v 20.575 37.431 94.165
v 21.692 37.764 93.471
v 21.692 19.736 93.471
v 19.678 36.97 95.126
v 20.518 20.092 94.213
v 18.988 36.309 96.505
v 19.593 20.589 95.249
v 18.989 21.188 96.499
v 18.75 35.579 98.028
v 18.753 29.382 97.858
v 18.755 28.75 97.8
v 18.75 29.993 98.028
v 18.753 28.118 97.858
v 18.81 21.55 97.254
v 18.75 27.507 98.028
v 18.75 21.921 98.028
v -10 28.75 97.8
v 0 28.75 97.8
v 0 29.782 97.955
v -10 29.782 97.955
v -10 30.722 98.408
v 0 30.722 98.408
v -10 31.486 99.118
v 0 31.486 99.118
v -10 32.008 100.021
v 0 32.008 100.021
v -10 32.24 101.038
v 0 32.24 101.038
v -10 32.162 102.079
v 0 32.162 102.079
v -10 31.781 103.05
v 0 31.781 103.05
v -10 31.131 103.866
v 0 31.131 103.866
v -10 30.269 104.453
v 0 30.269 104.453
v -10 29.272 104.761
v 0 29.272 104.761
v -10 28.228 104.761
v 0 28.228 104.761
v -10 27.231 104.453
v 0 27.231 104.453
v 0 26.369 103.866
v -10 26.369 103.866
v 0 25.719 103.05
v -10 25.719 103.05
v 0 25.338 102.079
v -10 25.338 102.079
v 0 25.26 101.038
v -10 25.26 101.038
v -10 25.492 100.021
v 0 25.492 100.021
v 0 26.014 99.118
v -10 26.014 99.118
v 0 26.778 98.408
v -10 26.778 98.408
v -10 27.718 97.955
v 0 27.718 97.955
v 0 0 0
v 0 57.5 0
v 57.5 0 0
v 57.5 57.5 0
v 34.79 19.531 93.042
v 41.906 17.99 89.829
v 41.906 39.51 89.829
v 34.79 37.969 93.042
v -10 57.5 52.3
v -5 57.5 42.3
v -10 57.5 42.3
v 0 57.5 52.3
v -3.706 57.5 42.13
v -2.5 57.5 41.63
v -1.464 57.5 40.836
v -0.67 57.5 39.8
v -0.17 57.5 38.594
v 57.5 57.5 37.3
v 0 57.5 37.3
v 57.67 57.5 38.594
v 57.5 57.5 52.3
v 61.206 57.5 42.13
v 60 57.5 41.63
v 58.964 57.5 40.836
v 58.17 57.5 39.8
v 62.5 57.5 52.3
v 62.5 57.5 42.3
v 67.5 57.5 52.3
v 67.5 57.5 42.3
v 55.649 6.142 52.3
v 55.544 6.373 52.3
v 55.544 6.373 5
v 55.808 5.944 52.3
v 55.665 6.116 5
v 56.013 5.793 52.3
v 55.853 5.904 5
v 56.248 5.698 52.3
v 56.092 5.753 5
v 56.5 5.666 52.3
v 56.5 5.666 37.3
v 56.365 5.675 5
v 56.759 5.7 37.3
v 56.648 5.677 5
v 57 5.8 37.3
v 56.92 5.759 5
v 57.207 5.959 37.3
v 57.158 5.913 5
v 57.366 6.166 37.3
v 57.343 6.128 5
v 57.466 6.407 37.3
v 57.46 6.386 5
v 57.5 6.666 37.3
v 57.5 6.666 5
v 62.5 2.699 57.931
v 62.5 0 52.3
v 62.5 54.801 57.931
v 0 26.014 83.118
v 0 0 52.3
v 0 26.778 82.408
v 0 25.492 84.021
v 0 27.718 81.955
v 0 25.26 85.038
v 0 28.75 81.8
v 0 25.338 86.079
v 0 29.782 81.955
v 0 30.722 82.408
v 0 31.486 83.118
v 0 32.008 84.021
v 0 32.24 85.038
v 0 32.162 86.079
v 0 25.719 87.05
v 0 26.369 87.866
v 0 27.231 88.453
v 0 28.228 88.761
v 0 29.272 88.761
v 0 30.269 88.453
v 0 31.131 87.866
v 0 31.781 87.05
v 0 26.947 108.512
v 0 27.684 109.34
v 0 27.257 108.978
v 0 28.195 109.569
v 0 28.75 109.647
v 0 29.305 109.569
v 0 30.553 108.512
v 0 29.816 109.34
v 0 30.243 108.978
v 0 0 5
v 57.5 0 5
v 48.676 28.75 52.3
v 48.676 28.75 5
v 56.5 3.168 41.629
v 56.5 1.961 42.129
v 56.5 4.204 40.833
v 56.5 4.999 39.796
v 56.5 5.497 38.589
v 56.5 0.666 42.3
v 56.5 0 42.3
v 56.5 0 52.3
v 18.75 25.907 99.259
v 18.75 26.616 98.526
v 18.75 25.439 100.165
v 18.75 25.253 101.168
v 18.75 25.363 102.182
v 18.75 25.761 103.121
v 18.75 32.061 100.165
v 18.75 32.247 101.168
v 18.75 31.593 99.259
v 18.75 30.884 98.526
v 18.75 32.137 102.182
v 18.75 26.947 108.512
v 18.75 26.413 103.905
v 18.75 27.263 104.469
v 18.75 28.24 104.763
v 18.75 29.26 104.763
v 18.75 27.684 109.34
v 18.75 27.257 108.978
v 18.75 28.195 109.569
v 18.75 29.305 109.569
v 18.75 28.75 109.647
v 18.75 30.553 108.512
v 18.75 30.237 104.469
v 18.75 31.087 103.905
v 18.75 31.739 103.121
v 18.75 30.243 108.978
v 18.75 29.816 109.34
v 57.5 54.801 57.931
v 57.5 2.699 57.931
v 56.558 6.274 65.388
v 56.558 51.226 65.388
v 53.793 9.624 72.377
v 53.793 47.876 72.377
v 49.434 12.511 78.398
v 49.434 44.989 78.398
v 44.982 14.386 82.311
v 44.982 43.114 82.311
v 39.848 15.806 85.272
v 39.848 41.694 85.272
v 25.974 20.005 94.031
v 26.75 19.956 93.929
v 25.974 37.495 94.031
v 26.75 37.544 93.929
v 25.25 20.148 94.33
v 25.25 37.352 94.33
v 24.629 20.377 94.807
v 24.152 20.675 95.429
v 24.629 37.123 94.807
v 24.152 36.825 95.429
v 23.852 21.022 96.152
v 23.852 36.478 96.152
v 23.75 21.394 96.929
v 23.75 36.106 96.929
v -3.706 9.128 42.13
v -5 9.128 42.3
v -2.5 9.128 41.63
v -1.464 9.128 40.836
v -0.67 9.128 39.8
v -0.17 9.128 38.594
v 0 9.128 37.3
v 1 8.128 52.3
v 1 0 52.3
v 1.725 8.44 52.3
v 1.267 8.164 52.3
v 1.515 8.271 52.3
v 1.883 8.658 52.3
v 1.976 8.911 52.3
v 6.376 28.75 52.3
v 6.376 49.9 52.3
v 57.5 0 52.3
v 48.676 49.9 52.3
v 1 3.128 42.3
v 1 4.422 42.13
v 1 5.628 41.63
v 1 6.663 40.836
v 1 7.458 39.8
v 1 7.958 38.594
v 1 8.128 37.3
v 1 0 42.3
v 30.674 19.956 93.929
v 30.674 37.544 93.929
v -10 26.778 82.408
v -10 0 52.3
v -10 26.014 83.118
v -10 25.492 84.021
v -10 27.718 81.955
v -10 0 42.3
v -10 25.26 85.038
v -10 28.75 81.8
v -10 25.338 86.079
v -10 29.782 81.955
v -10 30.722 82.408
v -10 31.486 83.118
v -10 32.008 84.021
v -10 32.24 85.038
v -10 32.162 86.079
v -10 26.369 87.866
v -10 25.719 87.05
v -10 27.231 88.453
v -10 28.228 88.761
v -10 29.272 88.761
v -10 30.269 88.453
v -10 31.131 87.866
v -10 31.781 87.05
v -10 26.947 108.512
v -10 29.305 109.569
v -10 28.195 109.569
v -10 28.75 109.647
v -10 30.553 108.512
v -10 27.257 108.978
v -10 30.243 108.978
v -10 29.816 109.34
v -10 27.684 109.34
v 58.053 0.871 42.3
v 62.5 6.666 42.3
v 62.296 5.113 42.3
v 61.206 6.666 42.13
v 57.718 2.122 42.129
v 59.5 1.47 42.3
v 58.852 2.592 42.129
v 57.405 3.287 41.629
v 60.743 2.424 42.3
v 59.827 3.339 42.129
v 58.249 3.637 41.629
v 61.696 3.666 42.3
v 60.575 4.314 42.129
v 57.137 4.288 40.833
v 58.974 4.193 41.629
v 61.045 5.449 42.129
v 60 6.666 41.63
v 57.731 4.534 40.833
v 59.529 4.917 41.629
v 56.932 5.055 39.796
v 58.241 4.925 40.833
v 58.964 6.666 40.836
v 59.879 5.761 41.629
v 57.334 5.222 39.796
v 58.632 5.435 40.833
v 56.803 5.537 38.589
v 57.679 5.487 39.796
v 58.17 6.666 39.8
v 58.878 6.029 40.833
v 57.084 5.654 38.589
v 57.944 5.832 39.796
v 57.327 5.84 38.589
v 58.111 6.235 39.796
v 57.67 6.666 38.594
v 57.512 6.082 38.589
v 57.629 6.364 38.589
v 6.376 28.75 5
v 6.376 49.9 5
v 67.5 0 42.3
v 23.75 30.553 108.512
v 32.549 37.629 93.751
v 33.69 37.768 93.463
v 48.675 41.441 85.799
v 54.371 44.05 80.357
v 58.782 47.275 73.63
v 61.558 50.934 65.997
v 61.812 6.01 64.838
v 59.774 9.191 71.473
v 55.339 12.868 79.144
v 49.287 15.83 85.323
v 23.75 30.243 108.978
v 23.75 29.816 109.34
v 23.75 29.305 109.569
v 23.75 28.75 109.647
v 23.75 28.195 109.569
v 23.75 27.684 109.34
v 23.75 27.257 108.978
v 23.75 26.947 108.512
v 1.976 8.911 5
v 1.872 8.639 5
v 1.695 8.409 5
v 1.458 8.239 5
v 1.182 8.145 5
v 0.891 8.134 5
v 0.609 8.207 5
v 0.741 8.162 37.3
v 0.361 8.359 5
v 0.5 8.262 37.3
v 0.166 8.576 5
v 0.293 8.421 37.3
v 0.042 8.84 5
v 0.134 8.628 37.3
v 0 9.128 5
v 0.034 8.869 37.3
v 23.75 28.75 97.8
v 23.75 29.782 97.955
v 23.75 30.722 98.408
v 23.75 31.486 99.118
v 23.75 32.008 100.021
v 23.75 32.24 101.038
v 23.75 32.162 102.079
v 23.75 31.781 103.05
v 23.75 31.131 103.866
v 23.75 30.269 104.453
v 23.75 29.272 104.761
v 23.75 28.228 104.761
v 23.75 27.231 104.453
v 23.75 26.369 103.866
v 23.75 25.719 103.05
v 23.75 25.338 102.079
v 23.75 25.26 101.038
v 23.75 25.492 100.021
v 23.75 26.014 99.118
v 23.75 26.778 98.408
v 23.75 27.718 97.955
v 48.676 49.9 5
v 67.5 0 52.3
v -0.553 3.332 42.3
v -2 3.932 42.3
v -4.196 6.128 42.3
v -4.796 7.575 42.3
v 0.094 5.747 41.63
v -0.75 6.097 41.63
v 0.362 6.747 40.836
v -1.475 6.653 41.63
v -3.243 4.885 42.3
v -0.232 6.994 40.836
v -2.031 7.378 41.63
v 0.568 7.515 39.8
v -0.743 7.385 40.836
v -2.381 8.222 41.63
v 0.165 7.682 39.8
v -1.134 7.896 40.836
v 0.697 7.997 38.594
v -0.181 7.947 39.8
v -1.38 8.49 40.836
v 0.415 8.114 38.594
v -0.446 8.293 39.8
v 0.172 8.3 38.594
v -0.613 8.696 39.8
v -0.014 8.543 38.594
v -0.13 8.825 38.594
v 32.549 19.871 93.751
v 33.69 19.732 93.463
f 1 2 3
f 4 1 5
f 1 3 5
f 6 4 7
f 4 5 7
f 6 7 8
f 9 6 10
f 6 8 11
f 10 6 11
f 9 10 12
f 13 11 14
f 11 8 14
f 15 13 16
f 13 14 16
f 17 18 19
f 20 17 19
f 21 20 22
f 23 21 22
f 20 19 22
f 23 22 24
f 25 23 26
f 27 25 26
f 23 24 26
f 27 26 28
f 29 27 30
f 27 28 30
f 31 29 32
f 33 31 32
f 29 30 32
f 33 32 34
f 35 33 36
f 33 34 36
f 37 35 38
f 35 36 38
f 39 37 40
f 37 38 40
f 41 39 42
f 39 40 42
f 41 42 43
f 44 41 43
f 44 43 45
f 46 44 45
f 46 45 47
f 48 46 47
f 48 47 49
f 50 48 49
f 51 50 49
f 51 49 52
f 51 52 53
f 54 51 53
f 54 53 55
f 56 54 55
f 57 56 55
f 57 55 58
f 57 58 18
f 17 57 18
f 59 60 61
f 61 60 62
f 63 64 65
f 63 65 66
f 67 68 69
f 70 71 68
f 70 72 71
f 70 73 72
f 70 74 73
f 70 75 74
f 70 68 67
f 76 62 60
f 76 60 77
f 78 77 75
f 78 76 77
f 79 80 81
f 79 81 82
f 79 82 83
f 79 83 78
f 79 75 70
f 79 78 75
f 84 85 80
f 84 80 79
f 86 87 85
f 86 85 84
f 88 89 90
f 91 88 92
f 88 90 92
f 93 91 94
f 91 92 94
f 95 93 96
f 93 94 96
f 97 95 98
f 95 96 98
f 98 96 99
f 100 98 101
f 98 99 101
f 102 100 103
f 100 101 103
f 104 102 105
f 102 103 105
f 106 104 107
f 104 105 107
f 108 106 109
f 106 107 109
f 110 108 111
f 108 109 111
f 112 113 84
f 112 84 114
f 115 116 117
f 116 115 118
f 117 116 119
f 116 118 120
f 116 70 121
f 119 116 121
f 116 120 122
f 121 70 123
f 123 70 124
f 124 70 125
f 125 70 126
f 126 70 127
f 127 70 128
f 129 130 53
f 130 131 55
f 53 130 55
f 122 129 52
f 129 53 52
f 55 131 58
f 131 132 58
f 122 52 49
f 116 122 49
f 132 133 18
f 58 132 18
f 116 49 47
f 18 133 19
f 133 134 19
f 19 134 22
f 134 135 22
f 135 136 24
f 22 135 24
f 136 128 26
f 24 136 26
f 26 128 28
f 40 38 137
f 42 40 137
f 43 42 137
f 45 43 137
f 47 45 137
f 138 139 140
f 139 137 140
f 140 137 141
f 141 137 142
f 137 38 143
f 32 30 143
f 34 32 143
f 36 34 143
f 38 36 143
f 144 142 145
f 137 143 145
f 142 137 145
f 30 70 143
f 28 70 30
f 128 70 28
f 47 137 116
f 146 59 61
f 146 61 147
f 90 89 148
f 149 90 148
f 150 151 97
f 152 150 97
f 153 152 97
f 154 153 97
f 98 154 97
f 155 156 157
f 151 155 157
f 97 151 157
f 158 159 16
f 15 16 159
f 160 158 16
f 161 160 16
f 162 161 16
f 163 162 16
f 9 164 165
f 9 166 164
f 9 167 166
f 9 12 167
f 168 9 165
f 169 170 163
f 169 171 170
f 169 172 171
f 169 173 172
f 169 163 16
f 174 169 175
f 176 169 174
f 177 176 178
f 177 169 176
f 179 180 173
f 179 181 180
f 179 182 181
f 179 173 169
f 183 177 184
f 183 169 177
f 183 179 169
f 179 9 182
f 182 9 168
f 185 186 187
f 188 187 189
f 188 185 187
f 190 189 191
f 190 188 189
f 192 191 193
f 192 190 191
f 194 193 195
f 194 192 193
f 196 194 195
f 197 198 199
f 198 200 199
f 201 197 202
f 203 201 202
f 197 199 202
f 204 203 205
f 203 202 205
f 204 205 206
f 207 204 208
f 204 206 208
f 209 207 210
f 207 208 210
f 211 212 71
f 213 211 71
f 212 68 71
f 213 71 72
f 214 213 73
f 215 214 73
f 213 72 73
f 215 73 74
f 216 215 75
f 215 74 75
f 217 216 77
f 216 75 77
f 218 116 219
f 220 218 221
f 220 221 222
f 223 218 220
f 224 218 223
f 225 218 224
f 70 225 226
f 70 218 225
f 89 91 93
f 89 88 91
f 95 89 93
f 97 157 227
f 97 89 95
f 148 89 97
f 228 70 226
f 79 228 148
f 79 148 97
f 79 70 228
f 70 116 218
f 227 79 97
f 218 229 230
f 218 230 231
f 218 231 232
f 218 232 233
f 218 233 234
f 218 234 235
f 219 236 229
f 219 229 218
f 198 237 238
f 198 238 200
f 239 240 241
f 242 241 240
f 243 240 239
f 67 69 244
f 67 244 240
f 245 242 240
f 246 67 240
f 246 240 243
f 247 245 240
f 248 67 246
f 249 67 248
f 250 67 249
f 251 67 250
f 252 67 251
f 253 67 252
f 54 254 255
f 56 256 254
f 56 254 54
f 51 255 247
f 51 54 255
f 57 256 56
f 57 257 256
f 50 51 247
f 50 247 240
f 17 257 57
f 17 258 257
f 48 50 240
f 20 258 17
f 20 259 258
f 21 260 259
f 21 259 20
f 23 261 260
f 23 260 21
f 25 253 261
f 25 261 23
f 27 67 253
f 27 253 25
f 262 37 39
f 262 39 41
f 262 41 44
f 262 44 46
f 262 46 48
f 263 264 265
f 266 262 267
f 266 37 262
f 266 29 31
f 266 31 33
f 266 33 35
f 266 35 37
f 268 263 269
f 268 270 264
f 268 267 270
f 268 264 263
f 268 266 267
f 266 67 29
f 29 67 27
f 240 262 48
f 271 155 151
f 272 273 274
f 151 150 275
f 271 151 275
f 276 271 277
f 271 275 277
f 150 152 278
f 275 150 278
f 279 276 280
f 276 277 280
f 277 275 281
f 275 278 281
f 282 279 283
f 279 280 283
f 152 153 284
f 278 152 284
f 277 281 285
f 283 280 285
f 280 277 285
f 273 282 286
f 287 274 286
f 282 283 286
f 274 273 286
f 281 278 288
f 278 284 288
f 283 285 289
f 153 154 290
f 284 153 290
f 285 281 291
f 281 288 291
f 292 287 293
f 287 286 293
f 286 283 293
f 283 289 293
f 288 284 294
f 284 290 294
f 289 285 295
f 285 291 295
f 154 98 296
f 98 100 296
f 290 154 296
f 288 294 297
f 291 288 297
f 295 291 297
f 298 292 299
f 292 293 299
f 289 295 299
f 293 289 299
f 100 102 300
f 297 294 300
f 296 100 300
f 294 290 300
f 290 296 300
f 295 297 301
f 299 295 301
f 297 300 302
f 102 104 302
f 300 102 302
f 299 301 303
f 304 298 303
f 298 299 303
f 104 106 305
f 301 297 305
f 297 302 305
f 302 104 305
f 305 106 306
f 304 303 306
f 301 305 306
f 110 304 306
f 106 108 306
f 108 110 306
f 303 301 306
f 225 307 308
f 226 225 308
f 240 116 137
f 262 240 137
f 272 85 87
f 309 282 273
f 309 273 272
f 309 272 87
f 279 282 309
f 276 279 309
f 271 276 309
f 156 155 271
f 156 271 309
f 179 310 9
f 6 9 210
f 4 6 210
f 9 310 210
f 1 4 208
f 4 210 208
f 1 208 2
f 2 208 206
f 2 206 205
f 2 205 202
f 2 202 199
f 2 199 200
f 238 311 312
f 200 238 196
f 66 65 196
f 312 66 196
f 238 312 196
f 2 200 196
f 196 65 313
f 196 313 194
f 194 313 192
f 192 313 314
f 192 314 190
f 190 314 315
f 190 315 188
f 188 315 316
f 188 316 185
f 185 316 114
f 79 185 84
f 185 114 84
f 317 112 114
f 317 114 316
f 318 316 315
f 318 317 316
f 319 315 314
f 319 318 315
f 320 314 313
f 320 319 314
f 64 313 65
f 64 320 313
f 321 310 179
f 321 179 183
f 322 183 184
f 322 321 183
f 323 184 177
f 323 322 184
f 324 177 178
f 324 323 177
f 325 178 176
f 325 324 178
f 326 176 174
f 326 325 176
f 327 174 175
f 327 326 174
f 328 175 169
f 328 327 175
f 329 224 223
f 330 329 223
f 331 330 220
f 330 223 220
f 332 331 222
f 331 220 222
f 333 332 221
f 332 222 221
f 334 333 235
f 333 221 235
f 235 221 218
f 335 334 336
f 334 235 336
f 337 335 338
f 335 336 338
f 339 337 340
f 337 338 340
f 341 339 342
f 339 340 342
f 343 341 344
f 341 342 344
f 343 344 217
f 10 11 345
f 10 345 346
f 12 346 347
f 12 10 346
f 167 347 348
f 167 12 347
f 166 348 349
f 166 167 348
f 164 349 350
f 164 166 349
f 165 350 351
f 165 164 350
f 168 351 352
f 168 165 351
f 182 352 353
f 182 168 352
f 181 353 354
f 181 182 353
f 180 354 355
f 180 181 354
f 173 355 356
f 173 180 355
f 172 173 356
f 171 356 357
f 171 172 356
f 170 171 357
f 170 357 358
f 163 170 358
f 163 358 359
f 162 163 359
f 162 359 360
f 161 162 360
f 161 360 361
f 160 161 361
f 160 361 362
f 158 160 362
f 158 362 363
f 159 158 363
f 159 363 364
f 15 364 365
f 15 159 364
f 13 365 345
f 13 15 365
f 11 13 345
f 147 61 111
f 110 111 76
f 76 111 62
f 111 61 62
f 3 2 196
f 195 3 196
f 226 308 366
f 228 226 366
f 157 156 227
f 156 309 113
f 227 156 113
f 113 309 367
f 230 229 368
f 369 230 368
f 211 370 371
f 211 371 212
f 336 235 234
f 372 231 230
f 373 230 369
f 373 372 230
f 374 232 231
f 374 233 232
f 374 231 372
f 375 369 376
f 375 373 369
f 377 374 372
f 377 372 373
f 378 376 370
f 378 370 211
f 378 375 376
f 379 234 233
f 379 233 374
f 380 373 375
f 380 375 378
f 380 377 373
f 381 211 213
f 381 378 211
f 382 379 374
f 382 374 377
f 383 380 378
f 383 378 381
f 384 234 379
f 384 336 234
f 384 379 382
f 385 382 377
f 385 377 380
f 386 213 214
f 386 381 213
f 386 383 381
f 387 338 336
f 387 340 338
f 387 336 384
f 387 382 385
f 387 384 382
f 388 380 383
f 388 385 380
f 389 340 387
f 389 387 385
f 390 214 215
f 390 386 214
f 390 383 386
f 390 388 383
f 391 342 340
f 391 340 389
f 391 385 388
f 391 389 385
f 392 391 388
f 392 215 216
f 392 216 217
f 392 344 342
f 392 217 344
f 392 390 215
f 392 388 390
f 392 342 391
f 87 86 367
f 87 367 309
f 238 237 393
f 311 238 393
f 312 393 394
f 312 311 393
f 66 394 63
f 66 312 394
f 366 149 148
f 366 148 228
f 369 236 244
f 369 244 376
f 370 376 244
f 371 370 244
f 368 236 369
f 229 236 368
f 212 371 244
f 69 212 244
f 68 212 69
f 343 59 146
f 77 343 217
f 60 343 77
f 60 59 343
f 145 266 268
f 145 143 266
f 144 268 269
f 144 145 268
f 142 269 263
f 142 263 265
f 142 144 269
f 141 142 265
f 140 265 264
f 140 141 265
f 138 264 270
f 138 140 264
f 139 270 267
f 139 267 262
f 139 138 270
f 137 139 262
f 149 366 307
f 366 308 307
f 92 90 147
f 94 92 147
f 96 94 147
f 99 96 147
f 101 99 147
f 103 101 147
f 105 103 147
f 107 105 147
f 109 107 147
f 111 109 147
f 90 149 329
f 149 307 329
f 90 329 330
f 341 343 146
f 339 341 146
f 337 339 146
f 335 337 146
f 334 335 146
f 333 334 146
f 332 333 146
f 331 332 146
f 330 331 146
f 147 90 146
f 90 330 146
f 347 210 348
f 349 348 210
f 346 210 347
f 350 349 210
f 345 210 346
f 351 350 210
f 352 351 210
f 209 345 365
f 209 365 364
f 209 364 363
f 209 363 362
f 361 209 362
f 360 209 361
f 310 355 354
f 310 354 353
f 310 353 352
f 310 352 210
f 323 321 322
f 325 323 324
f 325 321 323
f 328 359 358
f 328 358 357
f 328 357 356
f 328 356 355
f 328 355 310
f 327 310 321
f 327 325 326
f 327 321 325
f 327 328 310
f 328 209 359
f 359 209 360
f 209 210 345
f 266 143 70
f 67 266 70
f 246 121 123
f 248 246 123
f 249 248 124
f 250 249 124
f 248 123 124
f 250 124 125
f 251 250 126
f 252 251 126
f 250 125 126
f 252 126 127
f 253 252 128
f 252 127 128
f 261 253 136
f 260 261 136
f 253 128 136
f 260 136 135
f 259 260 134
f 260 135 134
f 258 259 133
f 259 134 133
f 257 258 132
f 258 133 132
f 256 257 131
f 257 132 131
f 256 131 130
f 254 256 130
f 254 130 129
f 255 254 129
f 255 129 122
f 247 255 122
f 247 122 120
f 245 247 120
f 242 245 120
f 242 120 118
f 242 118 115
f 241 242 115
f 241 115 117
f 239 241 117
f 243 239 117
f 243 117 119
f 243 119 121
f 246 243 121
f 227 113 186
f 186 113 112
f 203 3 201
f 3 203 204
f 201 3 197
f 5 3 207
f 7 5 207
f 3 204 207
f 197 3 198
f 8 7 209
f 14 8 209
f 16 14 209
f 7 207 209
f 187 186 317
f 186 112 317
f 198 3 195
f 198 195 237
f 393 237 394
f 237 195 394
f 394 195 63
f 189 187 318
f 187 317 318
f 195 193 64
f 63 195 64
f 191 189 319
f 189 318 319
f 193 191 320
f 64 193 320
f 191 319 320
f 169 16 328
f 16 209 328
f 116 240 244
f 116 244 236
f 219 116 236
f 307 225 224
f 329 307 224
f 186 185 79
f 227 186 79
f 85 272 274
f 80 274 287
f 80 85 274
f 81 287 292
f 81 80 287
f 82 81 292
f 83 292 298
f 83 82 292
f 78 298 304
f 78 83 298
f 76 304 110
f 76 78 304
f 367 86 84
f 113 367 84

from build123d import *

# Parameters (mm, degrees)
SKETCH2_W           = 57.5
SKETCH2_H           = 57.5
BOSS_EXTRUDE1_DEPTH = 5
SKETCH3_W           = 57.5
SKETCH3_H           = 57.5
SKETCH3_W_2         = 42.3
SKETCH3_H_2         = 42.3
BOSS_EXTRUDE2_DEPTH = 47.3
SKETCH4_W           = 70
SKETCH4_H           = 57.5
BOSS_EXTRUDE3_DEPTH = 10
SKETCH5_W           = 70
SKETCH5_H           = 57.5
BOSS_EXTRUDE4_DEPTH = 10
SKETCH6_W           = 35
SKETCH6_H           = 57.5
BOSS_EXTRUDE5_DEPTH = 38.75
SKETCH7_R           = 3.5
CUT_EXTRUDE1_DEPTH  = 144.086652068
SKETCH8_R           = 3.5
CUT_EXTRUDE2_DEPTH  = 144.086652068
FILLET1_R           = 30
CUT_EXTRUDE3_DEPTH  = 144.066205582
CUT_EXTRUDE4_REACH  = 109.048
CUT_EXTRUDE5_DEPTH  = 149.047084333
FILLET4_R           = 2
FILLET5_R           = 30
FILLET6_R           = 5
SKETCH12_W          = 11
SKETCH12_H          = 10
BOSS_EXTRUDE6_DEPTH = 10
FILLET7_R           = 1
FILLET8_R           = 5
CUT_EXTRUDE6_DEPTH  = 142.014244348
FILLET10_R          = 3
FILLET11_R          = 10


with BuildPart() as part:
    # Sketch2 → Boss-Extrude1 (new body)
    with BuildSketch(Plane.XY):
        with Locations((28.75, 28.75)):
            Rectangle(SKETCH2_W, SKETCH2_H)
    extrude(amount=BOSS_EXTRUDE1_DEPTH)

    # Sketch3 → Boss-Extrude2 (add)
    with BuildSketch(Plane.XY.offset(5)):
        with Locations((28.75, 28.75)):
            Rectangle(SKETCH3_W, SKETCH3_H)
        with Locations((27.525892101, 28.75)):
            Rectangle(SKETCH3_W_2, SKETCH3_H_2, mode=Mode.SUBTRACT)
    extrude(amount=BOSS_EXTRUDE2_DEPTH)

    # Sketch4 → Boss-Extrude3 (add)
    with BuildSketch(Plane.ZY):
        with Locations((77.3, 28.75)):
            Rectangle(SKETCH4_W, SKETCH4_H)
    extrude(amount=BOSS_EXTRUDE3_DEPTH)

    # Sketch5 → Boss-Extrude4 (add)
    with BuildSketch(Plane(origin=(57.5, 0, 0), x_dir=(0, 0, -1), z_dir=(1, 0, 0))):
        with Locations((-77.3, 28.75)):
            Rectangle(SKETCH5_W, SKETCH5_H)
    extrude(amount=BOSS_EXTRUDE4_DEPTH)

    # Sketch6 → Boss-Extrude5 (add)
    with BuildSketch(Plane.ZY.offset(-57.5)):
        with Locations((94.8, 28.75)):
            Rectangle(SKETCH6_W, SKETCH6_H)
    extrude(amount=BOSS_EXTRUDE5_DEPTH)

    # Sketch7 → Cut-Extrude1 (cut, through all)
    with BuildSketch(Plane(origin=(0, 0, 0), x_dir=(0, 0, -1), z_dir=(1, 0, 0))):
        with Locations((-101.3, 28.75)):
            Circle(SKETCH7_R)
        with Locations((-85.3, 28.75)):
            Circle(SKETCH7_R)
    extrude(amount=-CUT_EXTRUDE1_DEPTH, mode=Mode.SUBTRACT)

    # Sketch8 → Cut-Extrude2 (cut, through all)
    with BuildSketch(Plane(origin=(0, 0, 0), x_dir=(0, 0, -1), z_dir=(1, 0, 0))):
        with Locations((-101.3, 28.75)):
            Circle(SKETCH8_R)
    extrude(amount=CUT_EXTRUDE2_DEPTH, mode=Mode.SUBTRACT)

    # Fillet1
    # the kernel refuses this fillet: 30 mm, written as the material it takes off along each edge
    with BuildSketch(Plane(origin=(75, 57.5, 112.3), x_dir=(0, -1, 0), z_dir=(-1, 0, 0)), Plane(origin=(75, 0, 112.3), x_dir=(0, 0, -1), z_dir=(-1, 0, 0))) as fillet1_piece_1:
        with BuildLine():
            CenterArc((FILLET1_R, -FILLET1_R), FILLET1_R, 90, 90)
            Line((0, -FILLET1_R), (0, 0))
            Line((0, 0), (FILLET1_R, 0))
        make_face()
    extrude(amount=160, mode=Mode.SUBTRACT)
    with BuildSketch(Plane(origin=(142.5, 57.5, 112.3), x_dir=(0, -1, 0), z_dir=(-1, 0, 0)), Plane(origin=(142.5, 0, 112.3), x_dir=(0, 0, -1), z_dir=(-1, 0, 0))) as fillet1_piece_2:
        with BuildLine():
            CenterArc((FILLET1_R, -FILLET1_R), FILLET1_R, 90, 90)
            Line((0, -FILLET1_R), (0, 0))
            Line((0, 0), (FILLET1_R, 0))
        make_face()
    extrude(amount=198.75, mode=Mode.SUBTRACT)

    # Sketch9 → Cut-Extrude3 (cut, through all)
    with BuildSketch(Plane.XZ):
        Polygon((18.75, 77.3), (18.75, 94.8), (57.5, 77.3), align=None)
    extrude(amount=-CUT_EXTRUDE3_DEPTH, mode=Mode.SUBTRACT)

    # Cut-Extrude4: up to this face of the body (flat: up to its plane)
    cut_extrude4_end = Plane(part.part.faces().sort_by_distance((27.525892101, 28.75, 5))[0])
    # Sketch10 → Cut-Extrude4 (cut, up to the picked face)
    with BuildSketch(Plane.XY.offset(52.3), mode=Mode.PRIVATE) as cut_extrude4_sk1:
        Polygon((6.375892101, 28.75), (0, 0), (57.5, 0), (48.675892101, 28.75), align=None)
    cut_extrude4_tool1 = split(extrude(cut_extrude4_sk1.sketch, amount=-CUT_EXTRUDE4_REACH, mode=Mode.PRIVATE), bisect_by=cut_extrude4_end, keep=Keep.BOTH, mode=Mode.PRIVATE)
    add(cut_extrude4_tool1.solids().sort_by(Axis((28.169019, 13.645207, 52.3), (0, 0, -1)))[0], mode=Mode.SUBTRACT)

    # Sketch11 → Cut-Extrude5 (cut, through all)
    with BuildSketch(Plane(origin=(67.5, 0, 0), x_dir=(0, 0, -1), z_dir=(1, 0, 0))):
        with BuildLine():
            ThreePointArc((-82.3, 57.5), (-103.066559657, 49.150635095), (-112.273947021, 28.75))
            Line((-112.273947021, 28.75), (-52.3, 57.5))
            Line((-52.3, 57.5), (-82.3, 57.5))
        make_face()
        with BuildLine():
            Line((-52.3, 0), (-112.273947021, 28.75))
            ThreePointArc((-112.273947021, 28.75), (-103.066559657, 8.349364905), (-82.3, 0))
            Line((-82.3, 0), (-52.3, 0))
        make_face()
    extrude(amount=-CUT_EXTRUDE5_DEPTH, mode=Mode.SUBTRACT)

    # Fillet4
    fillet4_edges = [part.edges().sort_by_distance(p)[0] for p in [
        (-5, 28.75, 112.273947021),
        (43.125, 28.75, 112.273947021),
    ]]
    fillet(fillet4_edges, radius=FILLET4_R)

    # Fillet5
    fillet5_edges = [part.edges().sort_by_distance(p)[0] for p in [
        (57.5, 28.75, 77.3),
    ]]
    fillet(fillet5_edges, radius=FILLET5_R)

    # Fillet6
    # the kernel refuses this fillet: 5 mm, written as the material it takes off along each edge
    with BuildSketch(Plane(origin=(18.75, 12.302985171, 94.8), x_dir=(0.9113705996586746, 0, -0.4115867224264991), z_dir=(0, 1, 0))) as fillet6_piece_1:
        with BuildLine():
            CenterArc((FILLET6_R * 0.645635571077, -FILLET6_R), FILLET6_R, 90, 65.695450734)
            Line((-FILLET6_R * 0.265735028582, -FILLET6_R * 0.588413277574), (0, 0))
            Line((0, 0), (FILLET6_R * 0.645635571077, 0))
        make_face()
    extrude(amount=32.894029659, mode=Mode.SUBTRACT)

    # Sketch12 → Boss-Extrude6 (add)
    with BuildSketch(Plane.XZ):
        with Locations((-4.5, 47.3)):
            Rectangle(SKETCH12_W, SKETCH12_H)
        with Locations((62, 47.3)):
            Rectangle(SKETCH12_W, SKETCH12_H)
    extrude(amount=-BOSS_EXTRUDE6_DEPTH)

    # Fillet7
    # the kernel refuses this fillet: 1 mm, written as the material it takes off along each edge
    with BuildSketch(Plane(origin=(57.5, 0, 5), x_dir=(-0.29341611276772167, 0.9559848245491555, 0), z_dir=(0, 0, 1))) as fillet7_piece_1_section:
        with BuildLine():
            CenterArc((FILLET7_R * 6.66624885082, -FILLET7_R), FILLET7_R, 90, 162.937415162)
            Line((FILLET7_R * 6.37283273805, -FILLET7_R * 1.95598482455), (0, 0))
            Line((0, 0), (FILLET7_R * 6.66624885082, 0))
        make_face()
    fillet7_piece_1 = extrude(amount=53.965622127, mode=Mode.PRIVATE)
    fillet7_piece_1 = split(fillet7_piece_1, bisect_by=Plane(origin=(56.5, 4.962220999, 23.65), z_dir=(-1, 0, 0)), keep=Keep.TOP, mode=Mode.PRIVATE)
    add(fillet7_piece_1, mode=Mode.SUBTRACT)
    with BuildSketch(Plane(origin=(57.5, 0, 5), x_dir=(-0.29341611276772167, 0.9559848245491555, 0), z_dir=(0, 0, 1))) as fillet7_piece_2:
        with BuildLine():
            CenterArc((FILLET7_R * 6.66624885082, -FILLET7_R), FILLET7_R, 90, 162.937415162)
            Line((FILLET7_R * 6.37283273805, -FILLET7_R * 1.95598482455), (0, 0))
            Line((0, 0), (FILLET7_R * 6.66624885082, 0))
        make_face()
    extrude(amount=37.3, mode=Mode.SUBTRACT)
    with BuildSketch(Plane(origin=(0, 0, 65.119750157), x_dir=(0, 1, 0), z_dir=(0, 0, -1))) as fillet7_piece_3_section:
        with BuildLine():
            CenterArc((FILLET7_R * 9.12790006293, FILLET7_R), FILLET7_R, 102.504122974, 167.495877026)
            Line((FILLET7_R * 8.91139019581, FILLET7_R * 1.97628042971), (0, 0))
            Line((0, 0), (FILLET7_R * 9.12790006293, 0))
        make_face()
    fillet7_piece_3 = extrude(amount=60.119750157, mode=Mode.PRIVATE)
    fillet7_piece_3 = split(fillet7_piece_3, bisect_by=Plane(origin=(1, 7.031734734, 47.3), z_dir=(1, 0, 0)), keep=Keep.TOP, mode=Mode.PRIVATE)
    add(fillet7_piece_3, mode=Mode.SUBTRACT)
    with BuildSketch(Plane(origin=(0, 0, 42.3), x_dir=(0, 1, 0), z_dir=(0, 0, -1))) as fillet7_piece_4:
        with BuildLine():
            CenterArc((FILLET7_R * 9.12790006293, FILLET7_R), FILLET7_R, 102.504122974, 167.495877026)
            Line((FILLET7_R * 8.91139019581, FILLET7_R * 1.97628042971), (0, 0))
            Line((0, 0), (FILLET7_R * 9.12790006293, 0))
        make_face()
    extrude(amount=37.3, mode=Mode.SUBTRACT)

    # Fillet8
    fillet8_edges = [part.edges().sort_by_distance(p)[0] for p in [
        (0.292893219, 8.420793282, 42.3),
        (57.207106781, 5.95914207, 42.3),
        (0, 33.313950031, 42.3),
        (57.5, 32.083124425, 42.3),
    ]]
    fillet(fillet8_edges, radius=FILLET8_R)

    # Sketch13 → Cut-Extrude6 (cut, through all)
    with BuildSketch(Plane.XZ):
        with BuildLine():
            Line((32.827767642, 93.928540856), (23.75, 93.928540856))
            Line((23.75, 93.928540856), (23.75, 98.028177855))
            Line((23.75, 98.028177855), (23.75, 108.511784994))
            Line((23.75, 108.511784994), (23.75, 111.823529661))
            Line((23.75, 111.823529661), (71.506891102, 111.823529661))
            Line((71.506891102, 111.823529661), (71.506891102, 52.3))
            Line((71.506891102, 52.3), (62.5, 52.3))
            Line((62.5, 52.3), (62.5, 57.930932868))
            ThreePointArc((62.5, 57.930932868), (56.904028083, 76.915219331), (41.905535285, 89.828903856))
            Line((41.905535285, 89.828903856), (32.827767642, 93.928540856))
        make_face()
    extrude(amount=-CUT_EXTRUDE6_DEPTH, mode=Mode.SUBTRACT)

    # Fillet10
    fillet10_edges = [part.edges().sort_by_distance(p)[0] for p in [
        (23.75, 28.75, 93.928540856),
    ]]
    fillet(fillet10_edges, radius=FILLET10_R)

    # Fillet11
    fillet11_edges = [part.edges().sort_by_distance(p)[0] for p in [
        (32.827767642, 28.75, 93.928540856),
    ]]
    fillet(fillet11_edges, radius=FILLET11_R)


solid = part.part
